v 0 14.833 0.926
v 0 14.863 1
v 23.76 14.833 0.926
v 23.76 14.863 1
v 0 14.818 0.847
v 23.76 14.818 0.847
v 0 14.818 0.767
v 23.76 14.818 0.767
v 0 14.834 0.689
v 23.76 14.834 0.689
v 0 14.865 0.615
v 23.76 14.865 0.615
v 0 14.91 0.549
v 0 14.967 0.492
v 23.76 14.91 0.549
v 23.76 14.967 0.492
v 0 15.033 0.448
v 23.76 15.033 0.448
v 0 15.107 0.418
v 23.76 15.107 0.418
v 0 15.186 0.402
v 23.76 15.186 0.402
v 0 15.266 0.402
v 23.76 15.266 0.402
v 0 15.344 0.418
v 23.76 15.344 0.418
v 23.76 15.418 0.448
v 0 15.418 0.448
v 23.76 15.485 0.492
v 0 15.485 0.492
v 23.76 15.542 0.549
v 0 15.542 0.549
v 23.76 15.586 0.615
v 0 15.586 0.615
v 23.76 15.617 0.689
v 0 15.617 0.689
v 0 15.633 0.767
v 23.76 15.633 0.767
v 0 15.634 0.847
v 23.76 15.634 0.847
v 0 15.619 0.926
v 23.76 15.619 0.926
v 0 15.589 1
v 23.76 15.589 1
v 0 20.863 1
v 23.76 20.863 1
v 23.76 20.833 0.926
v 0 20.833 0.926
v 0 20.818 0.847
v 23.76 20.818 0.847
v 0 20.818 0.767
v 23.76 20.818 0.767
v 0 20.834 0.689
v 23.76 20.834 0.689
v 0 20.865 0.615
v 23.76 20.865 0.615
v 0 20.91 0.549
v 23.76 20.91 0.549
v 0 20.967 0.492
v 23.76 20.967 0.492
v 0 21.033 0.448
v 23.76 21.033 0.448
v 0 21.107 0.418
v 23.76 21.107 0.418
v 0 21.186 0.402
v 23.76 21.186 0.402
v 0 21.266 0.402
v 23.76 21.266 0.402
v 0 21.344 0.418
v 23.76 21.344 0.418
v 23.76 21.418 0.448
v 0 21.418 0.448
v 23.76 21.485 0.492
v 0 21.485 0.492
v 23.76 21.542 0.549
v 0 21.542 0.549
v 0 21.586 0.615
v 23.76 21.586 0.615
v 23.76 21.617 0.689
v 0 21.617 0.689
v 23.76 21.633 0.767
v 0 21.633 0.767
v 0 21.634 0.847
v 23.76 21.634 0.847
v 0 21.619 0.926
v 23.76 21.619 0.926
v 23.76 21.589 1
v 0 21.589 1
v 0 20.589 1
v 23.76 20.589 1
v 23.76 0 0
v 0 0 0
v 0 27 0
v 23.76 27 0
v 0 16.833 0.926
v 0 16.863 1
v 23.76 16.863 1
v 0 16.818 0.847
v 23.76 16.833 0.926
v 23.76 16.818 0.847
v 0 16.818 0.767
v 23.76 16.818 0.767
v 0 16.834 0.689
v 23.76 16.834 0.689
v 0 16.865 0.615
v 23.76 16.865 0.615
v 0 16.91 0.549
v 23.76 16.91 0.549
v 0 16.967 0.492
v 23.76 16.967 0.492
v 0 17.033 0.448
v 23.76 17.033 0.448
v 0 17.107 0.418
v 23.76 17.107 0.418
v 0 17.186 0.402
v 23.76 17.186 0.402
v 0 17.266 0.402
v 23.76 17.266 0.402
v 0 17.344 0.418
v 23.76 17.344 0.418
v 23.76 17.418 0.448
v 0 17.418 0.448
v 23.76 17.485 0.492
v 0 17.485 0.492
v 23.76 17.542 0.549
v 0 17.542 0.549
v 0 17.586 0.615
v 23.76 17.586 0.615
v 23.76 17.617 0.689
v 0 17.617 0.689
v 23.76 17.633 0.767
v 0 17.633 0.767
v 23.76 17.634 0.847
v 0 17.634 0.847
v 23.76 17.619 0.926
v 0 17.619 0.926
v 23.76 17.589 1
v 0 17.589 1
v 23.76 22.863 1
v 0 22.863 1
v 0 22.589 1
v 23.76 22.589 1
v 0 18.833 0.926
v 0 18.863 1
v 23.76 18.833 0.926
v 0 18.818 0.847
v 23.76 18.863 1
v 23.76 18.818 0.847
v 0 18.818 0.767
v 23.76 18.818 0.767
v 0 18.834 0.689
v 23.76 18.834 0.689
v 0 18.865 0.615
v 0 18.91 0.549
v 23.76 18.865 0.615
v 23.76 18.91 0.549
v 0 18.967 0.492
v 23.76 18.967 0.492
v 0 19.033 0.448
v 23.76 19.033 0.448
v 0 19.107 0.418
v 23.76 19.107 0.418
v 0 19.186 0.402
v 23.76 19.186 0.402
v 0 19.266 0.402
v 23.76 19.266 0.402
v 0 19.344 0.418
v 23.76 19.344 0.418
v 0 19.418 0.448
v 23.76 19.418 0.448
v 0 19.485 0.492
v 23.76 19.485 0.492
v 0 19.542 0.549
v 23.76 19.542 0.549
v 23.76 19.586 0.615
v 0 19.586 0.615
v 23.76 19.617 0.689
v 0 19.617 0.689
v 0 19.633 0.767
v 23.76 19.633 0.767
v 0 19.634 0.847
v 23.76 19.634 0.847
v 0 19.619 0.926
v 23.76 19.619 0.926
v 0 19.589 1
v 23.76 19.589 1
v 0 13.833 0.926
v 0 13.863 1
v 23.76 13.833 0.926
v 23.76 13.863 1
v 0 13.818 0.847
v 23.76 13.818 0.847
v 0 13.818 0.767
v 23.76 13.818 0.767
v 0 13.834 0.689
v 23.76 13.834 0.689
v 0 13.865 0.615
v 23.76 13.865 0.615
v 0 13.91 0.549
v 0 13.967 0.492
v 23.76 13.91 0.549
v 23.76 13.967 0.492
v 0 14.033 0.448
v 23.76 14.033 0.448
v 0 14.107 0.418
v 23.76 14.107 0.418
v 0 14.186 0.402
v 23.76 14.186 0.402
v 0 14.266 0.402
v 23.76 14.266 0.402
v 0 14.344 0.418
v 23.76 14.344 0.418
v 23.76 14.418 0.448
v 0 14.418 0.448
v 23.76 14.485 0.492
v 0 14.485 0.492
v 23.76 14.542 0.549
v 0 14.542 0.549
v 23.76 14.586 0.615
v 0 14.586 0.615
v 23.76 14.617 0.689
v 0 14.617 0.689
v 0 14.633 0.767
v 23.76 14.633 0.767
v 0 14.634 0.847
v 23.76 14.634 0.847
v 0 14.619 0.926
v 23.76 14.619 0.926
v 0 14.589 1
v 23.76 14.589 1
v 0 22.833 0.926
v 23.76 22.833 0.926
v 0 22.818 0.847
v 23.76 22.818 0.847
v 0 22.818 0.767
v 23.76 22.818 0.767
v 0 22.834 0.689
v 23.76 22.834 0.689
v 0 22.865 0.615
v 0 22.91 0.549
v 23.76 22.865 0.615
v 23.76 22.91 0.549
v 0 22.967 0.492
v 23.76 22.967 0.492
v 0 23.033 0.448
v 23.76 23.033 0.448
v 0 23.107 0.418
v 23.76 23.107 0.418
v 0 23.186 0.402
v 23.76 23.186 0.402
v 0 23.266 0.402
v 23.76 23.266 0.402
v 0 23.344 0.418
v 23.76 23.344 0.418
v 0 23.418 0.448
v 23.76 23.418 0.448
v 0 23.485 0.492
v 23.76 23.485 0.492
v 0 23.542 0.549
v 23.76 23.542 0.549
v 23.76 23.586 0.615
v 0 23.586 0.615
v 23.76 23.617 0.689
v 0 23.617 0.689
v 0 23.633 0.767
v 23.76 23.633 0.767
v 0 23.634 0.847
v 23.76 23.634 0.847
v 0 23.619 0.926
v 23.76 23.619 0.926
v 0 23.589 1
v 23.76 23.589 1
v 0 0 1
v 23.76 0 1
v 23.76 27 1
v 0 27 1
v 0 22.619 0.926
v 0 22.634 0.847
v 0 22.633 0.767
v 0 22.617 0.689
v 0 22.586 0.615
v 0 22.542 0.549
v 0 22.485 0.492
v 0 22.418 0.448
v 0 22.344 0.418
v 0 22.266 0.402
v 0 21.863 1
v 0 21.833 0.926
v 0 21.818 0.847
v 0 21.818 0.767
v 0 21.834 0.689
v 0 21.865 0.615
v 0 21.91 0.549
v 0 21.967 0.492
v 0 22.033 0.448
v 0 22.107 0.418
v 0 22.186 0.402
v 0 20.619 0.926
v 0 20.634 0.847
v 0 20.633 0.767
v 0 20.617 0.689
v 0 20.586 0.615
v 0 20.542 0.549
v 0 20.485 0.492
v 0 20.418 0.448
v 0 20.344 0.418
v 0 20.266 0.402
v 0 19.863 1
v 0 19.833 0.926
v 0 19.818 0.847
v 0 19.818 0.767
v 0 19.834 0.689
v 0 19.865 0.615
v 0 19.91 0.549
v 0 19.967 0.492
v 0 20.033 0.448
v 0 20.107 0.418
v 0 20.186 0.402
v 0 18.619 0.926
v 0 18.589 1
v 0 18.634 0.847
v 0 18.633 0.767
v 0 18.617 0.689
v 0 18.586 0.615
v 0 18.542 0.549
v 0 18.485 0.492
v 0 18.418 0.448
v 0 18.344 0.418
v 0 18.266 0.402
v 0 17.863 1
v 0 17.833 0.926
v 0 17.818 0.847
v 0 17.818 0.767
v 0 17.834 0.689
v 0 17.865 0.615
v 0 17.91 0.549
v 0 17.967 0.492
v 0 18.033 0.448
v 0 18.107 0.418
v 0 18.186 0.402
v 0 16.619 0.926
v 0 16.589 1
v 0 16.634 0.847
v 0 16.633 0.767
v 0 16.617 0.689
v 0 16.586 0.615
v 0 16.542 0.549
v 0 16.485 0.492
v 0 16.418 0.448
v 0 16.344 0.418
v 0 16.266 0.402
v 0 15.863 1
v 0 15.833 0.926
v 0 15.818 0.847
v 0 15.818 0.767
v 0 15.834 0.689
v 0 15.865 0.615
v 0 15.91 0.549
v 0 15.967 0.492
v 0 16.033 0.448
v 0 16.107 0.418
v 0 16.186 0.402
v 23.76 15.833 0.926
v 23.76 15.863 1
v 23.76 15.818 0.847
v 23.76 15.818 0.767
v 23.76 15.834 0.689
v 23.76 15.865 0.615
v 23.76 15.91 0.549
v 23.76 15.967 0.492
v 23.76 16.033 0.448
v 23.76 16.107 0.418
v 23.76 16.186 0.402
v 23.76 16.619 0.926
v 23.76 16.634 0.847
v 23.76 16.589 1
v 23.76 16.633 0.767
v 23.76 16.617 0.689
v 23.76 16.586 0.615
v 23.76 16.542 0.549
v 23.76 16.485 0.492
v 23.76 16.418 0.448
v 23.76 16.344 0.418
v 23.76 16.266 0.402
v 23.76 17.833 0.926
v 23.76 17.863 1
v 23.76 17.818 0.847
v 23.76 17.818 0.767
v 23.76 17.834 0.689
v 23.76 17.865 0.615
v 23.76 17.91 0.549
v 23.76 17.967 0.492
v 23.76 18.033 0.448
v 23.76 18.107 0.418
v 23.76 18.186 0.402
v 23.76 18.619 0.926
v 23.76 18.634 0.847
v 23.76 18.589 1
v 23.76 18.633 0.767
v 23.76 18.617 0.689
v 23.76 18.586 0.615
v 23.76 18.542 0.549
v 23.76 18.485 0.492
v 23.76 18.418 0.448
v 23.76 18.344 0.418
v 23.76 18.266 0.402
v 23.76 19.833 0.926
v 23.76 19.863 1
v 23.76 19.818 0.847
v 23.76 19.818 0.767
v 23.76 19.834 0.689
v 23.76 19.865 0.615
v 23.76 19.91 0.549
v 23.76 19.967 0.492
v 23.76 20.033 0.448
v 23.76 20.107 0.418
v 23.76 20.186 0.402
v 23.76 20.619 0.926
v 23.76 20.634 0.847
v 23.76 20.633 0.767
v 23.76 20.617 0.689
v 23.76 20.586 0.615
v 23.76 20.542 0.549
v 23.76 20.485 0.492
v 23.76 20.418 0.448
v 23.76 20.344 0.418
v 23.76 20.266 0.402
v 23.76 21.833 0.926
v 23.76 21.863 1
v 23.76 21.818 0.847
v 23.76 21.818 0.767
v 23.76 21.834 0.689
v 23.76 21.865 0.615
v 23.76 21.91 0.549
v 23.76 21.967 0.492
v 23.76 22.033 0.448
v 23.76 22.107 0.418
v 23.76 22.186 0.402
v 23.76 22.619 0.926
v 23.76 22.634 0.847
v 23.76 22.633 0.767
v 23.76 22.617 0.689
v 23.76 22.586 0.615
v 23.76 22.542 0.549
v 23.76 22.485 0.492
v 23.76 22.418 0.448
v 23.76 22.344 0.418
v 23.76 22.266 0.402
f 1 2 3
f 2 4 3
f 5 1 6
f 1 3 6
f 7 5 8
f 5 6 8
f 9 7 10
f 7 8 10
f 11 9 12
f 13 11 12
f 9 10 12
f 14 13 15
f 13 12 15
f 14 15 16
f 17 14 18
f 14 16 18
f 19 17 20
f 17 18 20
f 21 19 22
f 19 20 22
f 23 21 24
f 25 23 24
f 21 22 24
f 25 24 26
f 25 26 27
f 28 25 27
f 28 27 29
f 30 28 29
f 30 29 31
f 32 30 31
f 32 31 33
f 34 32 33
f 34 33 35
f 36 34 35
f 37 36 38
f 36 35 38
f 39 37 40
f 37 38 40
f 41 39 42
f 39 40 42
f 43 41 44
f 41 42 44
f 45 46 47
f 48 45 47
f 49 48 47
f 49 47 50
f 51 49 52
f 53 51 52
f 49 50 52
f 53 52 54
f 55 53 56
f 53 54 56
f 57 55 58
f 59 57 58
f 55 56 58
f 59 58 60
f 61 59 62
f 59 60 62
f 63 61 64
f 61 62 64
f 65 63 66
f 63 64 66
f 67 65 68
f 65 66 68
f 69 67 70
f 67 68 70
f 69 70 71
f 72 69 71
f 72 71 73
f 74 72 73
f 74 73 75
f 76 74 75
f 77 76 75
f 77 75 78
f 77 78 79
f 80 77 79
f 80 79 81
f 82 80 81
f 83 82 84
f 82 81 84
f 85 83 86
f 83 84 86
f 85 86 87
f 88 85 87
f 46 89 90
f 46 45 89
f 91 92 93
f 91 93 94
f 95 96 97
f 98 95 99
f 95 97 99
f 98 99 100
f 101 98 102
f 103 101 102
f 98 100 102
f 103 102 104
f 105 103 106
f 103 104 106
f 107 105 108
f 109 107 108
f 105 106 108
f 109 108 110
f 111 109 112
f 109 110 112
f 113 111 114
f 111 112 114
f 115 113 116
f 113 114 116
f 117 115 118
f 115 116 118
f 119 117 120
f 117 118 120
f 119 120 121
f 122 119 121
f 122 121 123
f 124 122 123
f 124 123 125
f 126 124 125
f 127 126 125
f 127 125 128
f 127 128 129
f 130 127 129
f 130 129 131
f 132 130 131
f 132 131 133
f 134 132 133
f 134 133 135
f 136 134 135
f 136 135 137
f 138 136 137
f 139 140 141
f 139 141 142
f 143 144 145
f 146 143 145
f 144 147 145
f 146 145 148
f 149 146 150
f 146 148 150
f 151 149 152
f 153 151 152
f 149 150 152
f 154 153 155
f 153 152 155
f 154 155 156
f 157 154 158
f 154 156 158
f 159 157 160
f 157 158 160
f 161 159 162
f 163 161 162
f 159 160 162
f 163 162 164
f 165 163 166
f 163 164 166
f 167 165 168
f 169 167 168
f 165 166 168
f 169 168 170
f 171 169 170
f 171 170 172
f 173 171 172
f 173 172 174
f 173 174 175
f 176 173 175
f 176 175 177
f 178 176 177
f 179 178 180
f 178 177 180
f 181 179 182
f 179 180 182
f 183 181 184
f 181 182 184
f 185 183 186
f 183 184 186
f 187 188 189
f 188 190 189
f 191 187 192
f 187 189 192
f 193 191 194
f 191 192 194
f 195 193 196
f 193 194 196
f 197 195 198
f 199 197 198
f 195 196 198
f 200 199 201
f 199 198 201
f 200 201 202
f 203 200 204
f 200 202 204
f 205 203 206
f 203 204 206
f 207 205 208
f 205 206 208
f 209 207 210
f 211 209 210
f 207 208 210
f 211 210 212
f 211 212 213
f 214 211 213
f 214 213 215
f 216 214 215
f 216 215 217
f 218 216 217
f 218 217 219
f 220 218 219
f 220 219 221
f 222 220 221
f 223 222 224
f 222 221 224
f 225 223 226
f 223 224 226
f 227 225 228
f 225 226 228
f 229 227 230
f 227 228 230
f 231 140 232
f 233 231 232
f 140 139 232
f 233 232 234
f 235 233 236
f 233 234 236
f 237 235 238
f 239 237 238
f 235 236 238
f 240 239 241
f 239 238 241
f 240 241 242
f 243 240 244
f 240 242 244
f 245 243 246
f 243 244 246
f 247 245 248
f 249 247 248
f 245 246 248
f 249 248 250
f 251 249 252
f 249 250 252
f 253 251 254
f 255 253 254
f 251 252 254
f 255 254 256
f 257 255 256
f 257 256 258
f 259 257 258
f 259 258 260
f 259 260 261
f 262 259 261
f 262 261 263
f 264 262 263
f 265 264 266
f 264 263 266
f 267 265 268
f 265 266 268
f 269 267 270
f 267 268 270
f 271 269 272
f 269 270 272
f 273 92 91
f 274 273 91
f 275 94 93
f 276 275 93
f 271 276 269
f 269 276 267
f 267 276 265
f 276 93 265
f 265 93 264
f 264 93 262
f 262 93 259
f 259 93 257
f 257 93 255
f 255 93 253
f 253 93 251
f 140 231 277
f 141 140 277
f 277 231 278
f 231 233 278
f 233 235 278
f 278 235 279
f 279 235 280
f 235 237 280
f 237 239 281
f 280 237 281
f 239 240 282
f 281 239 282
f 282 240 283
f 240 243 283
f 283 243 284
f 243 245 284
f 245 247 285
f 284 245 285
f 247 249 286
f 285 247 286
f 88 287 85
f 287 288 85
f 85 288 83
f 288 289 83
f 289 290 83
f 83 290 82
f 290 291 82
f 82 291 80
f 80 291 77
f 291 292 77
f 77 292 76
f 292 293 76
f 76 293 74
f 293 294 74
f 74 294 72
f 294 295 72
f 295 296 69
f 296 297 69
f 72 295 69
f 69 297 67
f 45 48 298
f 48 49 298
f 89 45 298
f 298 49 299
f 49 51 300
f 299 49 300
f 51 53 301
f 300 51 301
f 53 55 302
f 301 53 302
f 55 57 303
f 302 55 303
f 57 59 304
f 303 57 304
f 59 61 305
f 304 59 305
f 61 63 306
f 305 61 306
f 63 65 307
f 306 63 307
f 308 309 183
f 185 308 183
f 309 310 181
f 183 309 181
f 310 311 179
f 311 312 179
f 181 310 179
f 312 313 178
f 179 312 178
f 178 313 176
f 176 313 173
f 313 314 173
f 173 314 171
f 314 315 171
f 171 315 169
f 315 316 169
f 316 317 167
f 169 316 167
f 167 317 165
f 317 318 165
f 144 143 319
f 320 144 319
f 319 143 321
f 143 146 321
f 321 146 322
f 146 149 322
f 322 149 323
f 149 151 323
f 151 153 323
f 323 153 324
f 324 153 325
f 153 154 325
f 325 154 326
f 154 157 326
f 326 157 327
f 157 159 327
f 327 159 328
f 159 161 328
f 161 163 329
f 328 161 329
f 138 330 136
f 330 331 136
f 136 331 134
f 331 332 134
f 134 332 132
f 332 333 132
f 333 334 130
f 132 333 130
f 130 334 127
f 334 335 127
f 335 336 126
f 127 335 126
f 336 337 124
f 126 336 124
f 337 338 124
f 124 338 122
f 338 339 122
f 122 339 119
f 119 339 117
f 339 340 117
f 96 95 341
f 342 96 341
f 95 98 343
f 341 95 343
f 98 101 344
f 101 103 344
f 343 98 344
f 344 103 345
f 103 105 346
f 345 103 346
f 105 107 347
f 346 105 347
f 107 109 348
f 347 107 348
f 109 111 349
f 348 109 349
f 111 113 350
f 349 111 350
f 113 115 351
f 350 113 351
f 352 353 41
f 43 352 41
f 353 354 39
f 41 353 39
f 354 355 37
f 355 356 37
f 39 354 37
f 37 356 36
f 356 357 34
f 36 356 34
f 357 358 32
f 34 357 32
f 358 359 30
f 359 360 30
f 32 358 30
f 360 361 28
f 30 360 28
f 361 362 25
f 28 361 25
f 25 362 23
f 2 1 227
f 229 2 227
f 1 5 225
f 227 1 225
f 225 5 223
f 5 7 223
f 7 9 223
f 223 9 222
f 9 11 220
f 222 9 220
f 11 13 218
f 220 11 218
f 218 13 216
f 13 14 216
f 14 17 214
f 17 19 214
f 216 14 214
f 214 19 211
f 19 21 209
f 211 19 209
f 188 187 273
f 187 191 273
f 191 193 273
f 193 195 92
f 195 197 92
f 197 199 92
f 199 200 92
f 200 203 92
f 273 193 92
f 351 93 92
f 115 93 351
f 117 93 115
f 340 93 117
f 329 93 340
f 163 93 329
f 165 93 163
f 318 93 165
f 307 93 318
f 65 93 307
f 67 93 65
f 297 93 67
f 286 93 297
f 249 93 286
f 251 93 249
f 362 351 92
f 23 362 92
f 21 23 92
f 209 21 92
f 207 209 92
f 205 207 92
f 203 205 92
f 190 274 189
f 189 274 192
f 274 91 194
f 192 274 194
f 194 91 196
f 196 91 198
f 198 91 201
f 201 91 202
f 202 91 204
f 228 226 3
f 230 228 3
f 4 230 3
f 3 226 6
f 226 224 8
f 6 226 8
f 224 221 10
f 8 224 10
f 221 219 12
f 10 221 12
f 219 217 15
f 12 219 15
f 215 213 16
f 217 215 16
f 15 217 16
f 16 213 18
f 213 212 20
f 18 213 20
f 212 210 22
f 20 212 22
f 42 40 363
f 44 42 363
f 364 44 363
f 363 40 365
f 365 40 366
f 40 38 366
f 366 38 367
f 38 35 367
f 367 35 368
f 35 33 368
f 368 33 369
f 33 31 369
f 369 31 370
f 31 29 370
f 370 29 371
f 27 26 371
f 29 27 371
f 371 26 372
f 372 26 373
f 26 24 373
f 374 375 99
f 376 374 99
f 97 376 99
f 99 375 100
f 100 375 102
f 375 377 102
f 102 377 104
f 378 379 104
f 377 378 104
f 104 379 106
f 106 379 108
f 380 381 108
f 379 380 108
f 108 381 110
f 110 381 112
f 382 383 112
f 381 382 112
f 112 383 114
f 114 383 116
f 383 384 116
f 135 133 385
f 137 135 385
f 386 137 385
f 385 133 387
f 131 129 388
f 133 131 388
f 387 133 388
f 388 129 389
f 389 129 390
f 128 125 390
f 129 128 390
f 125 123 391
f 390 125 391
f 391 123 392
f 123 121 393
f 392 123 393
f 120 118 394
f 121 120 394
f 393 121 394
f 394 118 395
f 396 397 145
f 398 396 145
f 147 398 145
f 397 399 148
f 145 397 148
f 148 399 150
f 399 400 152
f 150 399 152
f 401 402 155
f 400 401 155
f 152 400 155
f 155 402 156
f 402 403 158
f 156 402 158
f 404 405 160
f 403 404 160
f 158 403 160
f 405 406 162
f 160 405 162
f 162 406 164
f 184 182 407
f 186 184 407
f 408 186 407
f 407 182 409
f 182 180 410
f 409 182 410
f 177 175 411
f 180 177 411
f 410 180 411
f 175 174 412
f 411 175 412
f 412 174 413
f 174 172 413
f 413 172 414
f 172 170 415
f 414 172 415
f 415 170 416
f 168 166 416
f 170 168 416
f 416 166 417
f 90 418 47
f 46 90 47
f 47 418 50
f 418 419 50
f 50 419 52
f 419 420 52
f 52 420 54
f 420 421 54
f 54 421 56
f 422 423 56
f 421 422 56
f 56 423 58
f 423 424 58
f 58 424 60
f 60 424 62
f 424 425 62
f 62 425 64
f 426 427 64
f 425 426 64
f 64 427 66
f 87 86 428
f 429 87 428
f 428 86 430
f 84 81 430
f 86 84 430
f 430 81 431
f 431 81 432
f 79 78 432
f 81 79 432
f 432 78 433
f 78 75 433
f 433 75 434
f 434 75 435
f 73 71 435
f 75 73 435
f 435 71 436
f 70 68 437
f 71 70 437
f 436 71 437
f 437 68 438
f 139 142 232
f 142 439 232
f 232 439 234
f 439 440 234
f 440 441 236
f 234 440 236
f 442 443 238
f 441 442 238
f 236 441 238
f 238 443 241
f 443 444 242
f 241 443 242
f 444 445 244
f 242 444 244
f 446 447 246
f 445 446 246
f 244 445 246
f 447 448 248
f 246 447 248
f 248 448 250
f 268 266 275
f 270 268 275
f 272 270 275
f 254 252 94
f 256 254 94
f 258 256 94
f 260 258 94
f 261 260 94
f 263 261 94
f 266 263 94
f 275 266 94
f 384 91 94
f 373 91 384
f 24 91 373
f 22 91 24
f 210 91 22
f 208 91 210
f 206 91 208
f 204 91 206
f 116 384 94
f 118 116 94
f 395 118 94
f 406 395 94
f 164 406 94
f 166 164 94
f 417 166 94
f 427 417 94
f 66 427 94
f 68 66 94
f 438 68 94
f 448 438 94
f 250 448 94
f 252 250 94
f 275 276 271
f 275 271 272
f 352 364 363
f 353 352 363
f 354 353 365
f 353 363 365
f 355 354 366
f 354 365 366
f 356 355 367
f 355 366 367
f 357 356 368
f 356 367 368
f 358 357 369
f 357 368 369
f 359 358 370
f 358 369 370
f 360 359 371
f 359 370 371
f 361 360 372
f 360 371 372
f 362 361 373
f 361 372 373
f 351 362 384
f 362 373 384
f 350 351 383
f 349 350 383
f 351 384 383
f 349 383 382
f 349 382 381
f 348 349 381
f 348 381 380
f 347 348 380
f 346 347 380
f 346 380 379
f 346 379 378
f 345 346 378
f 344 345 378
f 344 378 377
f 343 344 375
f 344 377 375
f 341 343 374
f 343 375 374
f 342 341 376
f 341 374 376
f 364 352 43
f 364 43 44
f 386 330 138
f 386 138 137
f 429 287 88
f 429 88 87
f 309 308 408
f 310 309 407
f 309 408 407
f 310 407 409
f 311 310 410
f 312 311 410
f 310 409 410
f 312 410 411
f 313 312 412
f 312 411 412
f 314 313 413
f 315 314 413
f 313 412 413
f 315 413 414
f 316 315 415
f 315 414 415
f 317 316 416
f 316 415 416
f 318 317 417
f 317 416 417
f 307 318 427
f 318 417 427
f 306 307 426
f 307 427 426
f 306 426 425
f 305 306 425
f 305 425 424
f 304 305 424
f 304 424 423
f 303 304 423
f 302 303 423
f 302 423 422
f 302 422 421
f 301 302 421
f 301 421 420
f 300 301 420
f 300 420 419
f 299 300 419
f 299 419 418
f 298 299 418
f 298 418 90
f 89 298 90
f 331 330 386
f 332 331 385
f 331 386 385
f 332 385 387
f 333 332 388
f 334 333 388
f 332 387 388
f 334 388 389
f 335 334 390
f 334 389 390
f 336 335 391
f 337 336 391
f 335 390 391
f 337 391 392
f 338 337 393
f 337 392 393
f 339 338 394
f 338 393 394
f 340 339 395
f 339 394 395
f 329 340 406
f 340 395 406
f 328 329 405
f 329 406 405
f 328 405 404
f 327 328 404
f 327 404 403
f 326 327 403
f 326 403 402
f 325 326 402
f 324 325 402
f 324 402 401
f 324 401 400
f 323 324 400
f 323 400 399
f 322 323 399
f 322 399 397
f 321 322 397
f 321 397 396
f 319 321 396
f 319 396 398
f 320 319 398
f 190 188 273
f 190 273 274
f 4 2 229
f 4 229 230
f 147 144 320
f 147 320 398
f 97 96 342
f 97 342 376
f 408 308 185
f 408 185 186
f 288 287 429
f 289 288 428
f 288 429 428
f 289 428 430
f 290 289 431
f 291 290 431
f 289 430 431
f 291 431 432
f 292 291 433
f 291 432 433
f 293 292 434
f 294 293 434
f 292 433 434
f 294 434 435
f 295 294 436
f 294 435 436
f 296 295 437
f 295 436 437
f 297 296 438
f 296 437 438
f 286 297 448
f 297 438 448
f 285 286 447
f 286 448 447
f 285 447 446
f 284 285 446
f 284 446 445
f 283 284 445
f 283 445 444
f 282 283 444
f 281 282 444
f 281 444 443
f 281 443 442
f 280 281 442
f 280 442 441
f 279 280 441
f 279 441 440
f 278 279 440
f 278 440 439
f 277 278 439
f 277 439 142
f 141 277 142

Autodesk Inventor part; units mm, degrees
ref_plane "YZ Plane" through (0, 0, 0) normal (1, 0, 0) x (0, 1, 0)
ref_plane "XZ Plane" through (0, 0, 0) normal (0, 1, 0) x (-1, 0, 0)
ref_plane "XY Plane" through (0, 0, 0) normal (0, 0, 1) x (1, 0, 0)
sketch "Sketch1" plane through (0, 0, 0) normal (0, 0, 1) x (1, 0, 0)
  line L0 (0, 0) -> (23.76, 0)
  line L1 (23.76, 0) -> (23.76, 27)
  line L2 (23.76, 27) -> (0, 27)
  line L3 (0, 27) -> (0, 0)
  dimension "d0" = 23.76
  dimension "d1" = 27
extrude "Extrusion1" add sketch "Sketch1" along normal blind 1
sketch "Sketch3" plane through (23.76, 0, 0) normal (1, 0, 0) x (0, 0, -1)
  line L0 (-1, 0) -> (-1, 27) projected
  line L1 (0, 0) -> (-1, 0) projected
  line L2 (0, 0) -> (0, 27) projected
  line L3 (0, 27) -> (-1, 27) projected
  circle A0 centre (-0.8098, 23.2257) radius 0.4098
  line L4 (-0.4, 23.7) -> (-0.4, 16.95) projected
  point P0 (0, 0)
extrude "Extrusion3" cut sketch "Sketch3" against normal through all contours A0 L0 | L0 A0
pattern_linear "Rectangular Pattern2" count 10 spacing 1 along (0, -1, 0) of "Extrusion3"
properties part number "00_chip_fibers_01"
